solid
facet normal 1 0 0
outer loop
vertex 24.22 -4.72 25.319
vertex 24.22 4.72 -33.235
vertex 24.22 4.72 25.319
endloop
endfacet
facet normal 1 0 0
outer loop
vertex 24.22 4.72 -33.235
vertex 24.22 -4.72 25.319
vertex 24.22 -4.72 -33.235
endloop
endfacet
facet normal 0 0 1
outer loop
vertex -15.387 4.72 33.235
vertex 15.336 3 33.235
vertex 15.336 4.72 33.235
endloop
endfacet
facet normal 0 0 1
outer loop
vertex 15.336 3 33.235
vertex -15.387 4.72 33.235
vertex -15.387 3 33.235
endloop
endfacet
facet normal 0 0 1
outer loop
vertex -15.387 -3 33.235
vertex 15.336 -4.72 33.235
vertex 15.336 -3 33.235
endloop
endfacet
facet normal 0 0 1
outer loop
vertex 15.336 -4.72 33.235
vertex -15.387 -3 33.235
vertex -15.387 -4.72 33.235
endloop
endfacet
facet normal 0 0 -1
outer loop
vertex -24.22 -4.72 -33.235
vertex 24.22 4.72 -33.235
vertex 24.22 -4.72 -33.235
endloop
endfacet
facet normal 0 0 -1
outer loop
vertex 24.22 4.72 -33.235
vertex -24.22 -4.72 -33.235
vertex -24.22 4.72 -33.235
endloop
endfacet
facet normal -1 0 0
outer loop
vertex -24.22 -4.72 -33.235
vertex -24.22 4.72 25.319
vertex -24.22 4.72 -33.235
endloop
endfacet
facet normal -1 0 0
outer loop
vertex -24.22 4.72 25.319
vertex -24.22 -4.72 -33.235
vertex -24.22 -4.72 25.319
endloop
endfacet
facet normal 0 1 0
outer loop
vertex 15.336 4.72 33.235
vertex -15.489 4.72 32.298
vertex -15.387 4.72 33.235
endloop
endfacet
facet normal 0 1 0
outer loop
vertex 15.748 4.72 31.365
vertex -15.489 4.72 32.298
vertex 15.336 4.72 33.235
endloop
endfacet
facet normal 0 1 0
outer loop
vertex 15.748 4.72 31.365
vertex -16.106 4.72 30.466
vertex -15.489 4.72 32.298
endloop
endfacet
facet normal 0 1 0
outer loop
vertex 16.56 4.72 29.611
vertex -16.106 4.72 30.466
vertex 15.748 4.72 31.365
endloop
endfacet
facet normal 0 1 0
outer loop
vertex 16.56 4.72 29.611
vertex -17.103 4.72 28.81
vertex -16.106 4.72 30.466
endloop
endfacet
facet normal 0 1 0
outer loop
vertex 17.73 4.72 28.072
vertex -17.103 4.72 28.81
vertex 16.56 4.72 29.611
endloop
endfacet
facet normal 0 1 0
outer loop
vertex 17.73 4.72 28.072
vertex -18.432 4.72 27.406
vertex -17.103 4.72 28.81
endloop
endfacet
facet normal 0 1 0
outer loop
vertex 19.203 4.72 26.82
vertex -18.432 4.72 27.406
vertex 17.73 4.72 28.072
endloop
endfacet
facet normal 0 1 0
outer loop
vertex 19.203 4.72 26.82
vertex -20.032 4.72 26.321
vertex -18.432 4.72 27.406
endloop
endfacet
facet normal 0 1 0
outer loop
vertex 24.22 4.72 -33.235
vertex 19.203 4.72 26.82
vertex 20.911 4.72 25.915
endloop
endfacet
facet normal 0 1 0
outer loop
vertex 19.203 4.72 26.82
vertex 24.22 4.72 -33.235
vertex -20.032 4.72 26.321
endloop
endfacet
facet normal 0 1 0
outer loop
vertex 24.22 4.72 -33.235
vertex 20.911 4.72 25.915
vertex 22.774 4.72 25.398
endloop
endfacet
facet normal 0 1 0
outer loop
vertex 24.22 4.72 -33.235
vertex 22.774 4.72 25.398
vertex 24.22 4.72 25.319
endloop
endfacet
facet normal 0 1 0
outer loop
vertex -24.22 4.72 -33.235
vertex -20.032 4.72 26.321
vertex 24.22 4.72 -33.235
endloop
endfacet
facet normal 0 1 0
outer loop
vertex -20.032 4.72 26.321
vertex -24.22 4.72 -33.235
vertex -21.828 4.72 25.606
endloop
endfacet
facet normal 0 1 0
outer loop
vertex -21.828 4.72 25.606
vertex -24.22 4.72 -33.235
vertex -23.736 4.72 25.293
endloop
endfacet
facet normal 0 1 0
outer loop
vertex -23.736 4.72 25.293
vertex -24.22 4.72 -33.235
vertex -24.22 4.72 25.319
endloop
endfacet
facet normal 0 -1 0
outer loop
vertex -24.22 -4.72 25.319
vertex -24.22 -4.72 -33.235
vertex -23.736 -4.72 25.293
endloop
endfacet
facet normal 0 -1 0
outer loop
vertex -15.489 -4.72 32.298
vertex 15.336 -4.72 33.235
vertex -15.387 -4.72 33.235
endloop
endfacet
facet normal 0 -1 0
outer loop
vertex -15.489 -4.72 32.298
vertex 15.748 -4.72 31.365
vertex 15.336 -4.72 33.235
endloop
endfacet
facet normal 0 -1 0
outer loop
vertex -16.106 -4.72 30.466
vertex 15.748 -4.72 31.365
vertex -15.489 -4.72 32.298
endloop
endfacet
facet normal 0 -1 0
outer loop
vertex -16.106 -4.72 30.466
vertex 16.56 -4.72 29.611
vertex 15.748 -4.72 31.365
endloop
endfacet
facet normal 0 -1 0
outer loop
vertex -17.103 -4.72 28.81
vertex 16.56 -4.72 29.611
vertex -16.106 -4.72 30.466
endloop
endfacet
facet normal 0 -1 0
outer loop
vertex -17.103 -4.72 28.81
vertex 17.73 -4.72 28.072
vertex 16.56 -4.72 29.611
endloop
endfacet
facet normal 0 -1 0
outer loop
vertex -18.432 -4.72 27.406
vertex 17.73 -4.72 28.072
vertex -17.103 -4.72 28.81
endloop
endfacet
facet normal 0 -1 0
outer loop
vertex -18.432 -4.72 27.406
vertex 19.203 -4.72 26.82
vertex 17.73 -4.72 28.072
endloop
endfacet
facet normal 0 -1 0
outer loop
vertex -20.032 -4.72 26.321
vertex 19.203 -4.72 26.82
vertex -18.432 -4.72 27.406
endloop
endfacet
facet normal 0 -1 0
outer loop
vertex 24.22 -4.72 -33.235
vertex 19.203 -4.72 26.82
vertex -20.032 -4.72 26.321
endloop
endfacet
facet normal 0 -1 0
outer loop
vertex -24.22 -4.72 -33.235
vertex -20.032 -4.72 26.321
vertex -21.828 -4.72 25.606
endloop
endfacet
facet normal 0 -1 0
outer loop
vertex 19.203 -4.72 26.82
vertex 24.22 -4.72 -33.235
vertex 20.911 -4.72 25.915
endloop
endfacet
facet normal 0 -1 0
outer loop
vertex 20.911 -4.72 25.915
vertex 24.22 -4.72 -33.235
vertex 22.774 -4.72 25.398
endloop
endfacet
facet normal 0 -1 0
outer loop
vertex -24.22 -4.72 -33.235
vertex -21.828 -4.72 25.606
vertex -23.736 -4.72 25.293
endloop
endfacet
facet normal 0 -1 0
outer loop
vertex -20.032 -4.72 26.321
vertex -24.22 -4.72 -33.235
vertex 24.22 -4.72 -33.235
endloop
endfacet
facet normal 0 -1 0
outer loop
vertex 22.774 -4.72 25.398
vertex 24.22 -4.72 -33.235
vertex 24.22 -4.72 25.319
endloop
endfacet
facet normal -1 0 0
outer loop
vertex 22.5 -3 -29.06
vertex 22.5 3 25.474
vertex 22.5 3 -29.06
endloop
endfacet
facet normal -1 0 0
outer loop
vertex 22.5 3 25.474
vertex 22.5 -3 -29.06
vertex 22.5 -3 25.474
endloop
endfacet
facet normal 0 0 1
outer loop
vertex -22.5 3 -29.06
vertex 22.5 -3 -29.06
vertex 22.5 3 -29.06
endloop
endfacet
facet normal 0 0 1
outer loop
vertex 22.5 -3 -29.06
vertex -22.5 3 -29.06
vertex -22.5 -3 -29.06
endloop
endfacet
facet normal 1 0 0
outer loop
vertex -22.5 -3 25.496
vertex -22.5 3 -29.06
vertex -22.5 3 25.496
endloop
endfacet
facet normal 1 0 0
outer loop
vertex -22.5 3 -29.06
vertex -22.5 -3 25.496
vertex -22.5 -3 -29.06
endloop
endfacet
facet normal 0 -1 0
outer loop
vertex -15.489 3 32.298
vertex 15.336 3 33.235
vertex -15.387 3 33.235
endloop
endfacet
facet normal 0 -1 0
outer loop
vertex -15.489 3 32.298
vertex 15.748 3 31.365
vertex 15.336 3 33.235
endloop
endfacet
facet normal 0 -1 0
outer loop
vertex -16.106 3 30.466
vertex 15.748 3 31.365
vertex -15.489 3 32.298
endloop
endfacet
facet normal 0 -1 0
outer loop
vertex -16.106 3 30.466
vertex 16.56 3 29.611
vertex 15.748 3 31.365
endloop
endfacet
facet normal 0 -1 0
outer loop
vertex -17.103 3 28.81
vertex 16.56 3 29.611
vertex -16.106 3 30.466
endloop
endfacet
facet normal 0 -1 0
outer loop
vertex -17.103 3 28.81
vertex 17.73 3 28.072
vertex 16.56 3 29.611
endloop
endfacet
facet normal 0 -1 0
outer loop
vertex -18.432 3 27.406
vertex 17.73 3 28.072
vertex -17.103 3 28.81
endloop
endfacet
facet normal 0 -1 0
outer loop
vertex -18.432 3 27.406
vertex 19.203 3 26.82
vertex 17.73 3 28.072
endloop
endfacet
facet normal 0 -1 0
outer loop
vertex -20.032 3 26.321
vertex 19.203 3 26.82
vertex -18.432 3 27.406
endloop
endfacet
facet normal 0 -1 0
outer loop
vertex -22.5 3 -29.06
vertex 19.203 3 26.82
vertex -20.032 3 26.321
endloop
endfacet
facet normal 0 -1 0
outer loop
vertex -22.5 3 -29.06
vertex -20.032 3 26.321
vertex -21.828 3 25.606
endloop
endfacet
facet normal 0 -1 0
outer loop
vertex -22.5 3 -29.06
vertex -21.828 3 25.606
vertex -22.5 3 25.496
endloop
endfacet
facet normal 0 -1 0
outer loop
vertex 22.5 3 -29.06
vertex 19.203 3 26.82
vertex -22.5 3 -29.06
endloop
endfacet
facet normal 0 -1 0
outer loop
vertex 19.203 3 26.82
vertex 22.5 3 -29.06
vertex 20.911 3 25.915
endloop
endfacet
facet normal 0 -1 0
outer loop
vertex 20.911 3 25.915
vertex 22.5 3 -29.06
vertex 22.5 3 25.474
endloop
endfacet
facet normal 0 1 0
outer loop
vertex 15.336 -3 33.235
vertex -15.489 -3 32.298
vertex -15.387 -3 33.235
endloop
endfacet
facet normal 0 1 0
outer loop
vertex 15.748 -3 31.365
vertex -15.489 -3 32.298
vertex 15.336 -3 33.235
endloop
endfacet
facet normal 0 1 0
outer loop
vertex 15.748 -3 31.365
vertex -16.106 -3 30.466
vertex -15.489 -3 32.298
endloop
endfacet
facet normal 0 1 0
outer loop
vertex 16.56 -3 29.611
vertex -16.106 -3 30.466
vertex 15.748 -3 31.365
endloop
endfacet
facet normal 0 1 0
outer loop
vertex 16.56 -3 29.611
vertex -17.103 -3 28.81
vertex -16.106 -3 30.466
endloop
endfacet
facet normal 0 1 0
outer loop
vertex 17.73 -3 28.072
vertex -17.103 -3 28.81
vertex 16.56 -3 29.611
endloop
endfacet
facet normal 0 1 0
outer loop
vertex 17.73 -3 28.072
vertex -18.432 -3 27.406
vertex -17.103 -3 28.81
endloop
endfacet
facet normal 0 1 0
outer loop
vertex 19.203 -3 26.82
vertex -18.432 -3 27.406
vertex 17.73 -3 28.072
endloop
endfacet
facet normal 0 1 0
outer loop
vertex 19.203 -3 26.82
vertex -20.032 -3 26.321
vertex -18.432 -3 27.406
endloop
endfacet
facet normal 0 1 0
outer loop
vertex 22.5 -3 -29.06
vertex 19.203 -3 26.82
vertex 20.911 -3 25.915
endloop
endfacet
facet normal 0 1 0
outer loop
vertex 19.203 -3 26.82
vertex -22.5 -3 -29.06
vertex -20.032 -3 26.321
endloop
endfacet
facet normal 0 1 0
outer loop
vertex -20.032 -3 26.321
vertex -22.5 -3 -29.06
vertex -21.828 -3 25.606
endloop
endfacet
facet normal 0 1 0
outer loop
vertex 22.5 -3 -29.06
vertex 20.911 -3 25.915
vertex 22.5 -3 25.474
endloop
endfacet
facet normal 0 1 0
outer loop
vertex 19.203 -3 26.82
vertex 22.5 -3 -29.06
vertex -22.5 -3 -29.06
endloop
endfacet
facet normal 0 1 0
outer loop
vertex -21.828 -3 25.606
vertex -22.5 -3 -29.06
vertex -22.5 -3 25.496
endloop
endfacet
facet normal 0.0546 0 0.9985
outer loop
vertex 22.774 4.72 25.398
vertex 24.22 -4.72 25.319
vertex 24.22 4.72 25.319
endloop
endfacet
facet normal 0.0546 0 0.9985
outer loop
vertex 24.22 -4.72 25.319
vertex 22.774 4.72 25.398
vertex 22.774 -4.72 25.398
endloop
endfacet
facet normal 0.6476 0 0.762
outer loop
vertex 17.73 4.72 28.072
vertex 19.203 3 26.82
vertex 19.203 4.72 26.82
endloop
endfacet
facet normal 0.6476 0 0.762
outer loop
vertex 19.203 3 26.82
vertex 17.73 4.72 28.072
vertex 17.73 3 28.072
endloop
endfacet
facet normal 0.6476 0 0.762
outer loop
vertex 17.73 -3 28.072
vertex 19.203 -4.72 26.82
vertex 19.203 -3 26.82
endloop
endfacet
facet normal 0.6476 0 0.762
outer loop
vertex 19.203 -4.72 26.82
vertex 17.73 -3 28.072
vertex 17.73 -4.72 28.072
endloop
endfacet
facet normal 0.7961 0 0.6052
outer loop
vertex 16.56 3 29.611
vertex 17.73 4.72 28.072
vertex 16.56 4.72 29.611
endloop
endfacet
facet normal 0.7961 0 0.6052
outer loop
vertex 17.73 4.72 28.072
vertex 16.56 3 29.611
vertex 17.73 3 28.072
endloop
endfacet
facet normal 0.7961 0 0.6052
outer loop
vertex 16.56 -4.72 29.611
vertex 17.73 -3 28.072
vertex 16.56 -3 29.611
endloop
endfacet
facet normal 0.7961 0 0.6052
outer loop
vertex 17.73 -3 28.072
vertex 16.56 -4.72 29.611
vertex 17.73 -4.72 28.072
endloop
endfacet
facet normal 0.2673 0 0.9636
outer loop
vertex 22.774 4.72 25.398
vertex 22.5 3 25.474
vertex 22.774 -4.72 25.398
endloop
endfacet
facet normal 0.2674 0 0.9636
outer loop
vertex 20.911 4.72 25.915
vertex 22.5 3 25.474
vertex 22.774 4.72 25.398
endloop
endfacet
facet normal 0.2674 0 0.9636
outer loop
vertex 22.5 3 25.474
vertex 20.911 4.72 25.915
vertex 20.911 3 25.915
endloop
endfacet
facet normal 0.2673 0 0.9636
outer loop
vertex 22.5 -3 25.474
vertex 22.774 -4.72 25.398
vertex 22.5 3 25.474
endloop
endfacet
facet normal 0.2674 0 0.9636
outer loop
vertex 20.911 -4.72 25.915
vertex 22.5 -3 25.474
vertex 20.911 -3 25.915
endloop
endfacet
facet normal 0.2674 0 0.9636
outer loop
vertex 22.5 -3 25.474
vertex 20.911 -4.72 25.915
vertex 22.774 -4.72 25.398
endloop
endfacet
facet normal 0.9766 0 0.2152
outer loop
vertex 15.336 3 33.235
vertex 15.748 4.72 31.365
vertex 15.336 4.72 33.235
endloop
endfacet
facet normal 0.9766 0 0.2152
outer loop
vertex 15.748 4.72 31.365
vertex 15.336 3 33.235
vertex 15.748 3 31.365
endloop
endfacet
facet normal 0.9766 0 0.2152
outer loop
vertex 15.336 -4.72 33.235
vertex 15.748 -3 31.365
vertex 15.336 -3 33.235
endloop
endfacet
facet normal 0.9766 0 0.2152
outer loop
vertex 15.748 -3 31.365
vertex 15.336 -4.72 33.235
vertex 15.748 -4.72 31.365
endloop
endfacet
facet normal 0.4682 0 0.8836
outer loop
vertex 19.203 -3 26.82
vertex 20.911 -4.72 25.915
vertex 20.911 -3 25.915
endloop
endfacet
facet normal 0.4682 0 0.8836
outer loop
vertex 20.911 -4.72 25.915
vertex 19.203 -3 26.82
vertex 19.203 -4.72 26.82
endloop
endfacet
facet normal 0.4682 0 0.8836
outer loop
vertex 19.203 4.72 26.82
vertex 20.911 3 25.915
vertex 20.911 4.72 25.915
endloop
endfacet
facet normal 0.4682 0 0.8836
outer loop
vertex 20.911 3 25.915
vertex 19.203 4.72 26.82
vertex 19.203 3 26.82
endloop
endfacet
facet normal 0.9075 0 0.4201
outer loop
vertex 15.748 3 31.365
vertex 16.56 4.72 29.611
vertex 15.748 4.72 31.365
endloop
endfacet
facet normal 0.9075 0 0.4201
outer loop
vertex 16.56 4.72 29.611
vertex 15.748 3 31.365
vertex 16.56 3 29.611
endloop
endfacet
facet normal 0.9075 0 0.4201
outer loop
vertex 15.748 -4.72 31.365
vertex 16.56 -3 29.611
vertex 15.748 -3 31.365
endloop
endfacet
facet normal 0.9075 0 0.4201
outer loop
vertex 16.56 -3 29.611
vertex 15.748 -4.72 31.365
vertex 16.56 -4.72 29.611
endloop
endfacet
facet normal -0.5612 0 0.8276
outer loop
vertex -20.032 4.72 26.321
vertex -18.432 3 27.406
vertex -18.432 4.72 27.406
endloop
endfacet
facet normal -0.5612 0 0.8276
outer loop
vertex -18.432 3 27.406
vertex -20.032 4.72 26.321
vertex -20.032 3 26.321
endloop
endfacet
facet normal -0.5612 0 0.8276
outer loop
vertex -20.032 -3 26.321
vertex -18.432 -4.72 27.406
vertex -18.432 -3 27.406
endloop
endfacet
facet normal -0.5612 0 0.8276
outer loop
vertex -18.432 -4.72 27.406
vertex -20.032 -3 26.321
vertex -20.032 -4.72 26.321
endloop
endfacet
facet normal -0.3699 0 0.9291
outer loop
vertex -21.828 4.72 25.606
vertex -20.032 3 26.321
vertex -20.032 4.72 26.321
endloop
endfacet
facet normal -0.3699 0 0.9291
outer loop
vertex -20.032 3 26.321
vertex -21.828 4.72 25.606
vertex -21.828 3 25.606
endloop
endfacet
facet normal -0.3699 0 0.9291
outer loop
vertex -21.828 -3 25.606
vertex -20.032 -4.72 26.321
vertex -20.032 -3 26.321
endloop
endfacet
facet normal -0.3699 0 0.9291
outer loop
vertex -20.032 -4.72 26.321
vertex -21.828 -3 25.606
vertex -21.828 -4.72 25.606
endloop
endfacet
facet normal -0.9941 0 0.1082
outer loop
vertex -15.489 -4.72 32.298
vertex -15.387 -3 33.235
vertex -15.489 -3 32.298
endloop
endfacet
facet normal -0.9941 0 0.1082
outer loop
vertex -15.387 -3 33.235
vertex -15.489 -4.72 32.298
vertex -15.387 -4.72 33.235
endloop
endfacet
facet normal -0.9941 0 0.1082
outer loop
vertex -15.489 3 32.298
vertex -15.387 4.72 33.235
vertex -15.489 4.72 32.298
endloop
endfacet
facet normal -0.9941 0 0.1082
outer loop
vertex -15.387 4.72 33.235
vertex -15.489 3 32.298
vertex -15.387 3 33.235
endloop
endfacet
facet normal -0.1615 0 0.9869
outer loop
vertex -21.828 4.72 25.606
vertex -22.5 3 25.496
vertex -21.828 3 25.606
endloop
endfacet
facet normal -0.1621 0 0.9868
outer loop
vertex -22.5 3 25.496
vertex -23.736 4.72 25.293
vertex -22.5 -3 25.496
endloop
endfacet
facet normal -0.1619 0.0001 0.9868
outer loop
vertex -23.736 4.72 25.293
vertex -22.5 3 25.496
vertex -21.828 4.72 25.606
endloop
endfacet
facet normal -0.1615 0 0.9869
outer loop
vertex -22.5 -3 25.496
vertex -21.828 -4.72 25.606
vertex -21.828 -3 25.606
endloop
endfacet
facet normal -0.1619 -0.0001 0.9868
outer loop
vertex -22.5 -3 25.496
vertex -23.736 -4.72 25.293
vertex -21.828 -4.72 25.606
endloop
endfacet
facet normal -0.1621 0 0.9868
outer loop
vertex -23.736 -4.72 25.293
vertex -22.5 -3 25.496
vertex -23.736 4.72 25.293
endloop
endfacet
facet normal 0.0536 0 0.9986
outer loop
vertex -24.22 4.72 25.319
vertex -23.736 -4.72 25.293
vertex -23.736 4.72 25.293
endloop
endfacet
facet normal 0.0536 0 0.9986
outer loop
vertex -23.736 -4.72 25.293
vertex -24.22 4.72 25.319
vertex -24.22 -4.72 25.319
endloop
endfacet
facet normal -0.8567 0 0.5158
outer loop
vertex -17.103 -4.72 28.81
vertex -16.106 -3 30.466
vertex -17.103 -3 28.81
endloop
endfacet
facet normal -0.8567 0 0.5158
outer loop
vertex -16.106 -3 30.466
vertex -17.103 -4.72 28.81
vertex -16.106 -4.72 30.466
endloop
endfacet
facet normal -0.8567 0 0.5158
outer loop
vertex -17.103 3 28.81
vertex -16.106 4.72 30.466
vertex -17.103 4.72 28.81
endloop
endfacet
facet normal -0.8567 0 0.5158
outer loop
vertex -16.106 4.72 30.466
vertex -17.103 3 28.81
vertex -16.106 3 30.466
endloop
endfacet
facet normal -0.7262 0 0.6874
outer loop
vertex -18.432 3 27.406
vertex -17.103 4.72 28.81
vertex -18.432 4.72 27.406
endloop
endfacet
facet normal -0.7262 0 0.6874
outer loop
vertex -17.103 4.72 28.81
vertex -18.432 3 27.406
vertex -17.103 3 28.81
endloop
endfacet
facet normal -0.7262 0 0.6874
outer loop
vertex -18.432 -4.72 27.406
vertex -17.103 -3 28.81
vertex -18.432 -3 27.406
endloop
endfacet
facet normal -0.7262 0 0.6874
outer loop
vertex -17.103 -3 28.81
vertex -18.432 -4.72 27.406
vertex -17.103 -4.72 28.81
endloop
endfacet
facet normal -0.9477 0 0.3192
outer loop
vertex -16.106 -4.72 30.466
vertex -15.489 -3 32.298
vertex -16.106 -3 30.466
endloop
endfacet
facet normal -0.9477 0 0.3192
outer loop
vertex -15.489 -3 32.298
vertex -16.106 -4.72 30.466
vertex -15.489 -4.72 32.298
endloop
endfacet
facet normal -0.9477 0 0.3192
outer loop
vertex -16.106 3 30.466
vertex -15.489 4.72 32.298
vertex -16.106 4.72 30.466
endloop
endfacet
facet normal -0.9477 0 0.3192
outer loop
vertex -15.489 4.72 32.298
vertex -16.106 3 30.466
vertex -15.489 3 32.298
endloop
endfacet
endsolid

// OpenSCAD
/*
Parametric Cell Phone Battery holder. 

Case to hold a spare battery without fear of shorting it out.

Created by Mike Creuzer - Mike@Creuzer.com - 20120816
*/

// Battery dimensions in mm
// Internal height
height = 65;
// Internal Width
width  = 45;
// Internal narrow bit
depth  = 6;

// Print Settings in mm
// Looking at the gcode of a sliced file often times tells you this at the top of the file
singleWallWidth = .49; 
// Number of walls you want
thickness          = 3; 
// how much added 'slop' you want so the case is easier to use.
clearence          = .5; 




difference()
{
	cube(size = [width + 2*thickness*singleWallWidth + clearence, depth + 2*thickness*singleWallWidth + clearence, height + thickness*singleWallWidth], center=true);

	translate([0,0,2*thickness*singleWallWidth + clearence]) cube(size = [width,depth, height], center=true);
	translate([.5*(width + 2*thickness*singleWallWidth + clearence),0,.5 * (height + 2*thickness*singleWallWidth + clearence)]) rotate([90,0,0]) cylinder(r = depth + 2*thickness*singleWallWidth, h=depth + 2*thickness*singleWallWidth + clearence, center=true);
	translate([-.5*(width + 2*thickness*singleWallWidth + clearence),0,.5 * (height + 2*thickness*singleWallWidth + clearence)]) rotate([90,0,0]) cylinder(r = depth + 2*thickness*singleWallWidth, h=depth + 2*thickness*singleWallWidth + clearence, center=true);

}
